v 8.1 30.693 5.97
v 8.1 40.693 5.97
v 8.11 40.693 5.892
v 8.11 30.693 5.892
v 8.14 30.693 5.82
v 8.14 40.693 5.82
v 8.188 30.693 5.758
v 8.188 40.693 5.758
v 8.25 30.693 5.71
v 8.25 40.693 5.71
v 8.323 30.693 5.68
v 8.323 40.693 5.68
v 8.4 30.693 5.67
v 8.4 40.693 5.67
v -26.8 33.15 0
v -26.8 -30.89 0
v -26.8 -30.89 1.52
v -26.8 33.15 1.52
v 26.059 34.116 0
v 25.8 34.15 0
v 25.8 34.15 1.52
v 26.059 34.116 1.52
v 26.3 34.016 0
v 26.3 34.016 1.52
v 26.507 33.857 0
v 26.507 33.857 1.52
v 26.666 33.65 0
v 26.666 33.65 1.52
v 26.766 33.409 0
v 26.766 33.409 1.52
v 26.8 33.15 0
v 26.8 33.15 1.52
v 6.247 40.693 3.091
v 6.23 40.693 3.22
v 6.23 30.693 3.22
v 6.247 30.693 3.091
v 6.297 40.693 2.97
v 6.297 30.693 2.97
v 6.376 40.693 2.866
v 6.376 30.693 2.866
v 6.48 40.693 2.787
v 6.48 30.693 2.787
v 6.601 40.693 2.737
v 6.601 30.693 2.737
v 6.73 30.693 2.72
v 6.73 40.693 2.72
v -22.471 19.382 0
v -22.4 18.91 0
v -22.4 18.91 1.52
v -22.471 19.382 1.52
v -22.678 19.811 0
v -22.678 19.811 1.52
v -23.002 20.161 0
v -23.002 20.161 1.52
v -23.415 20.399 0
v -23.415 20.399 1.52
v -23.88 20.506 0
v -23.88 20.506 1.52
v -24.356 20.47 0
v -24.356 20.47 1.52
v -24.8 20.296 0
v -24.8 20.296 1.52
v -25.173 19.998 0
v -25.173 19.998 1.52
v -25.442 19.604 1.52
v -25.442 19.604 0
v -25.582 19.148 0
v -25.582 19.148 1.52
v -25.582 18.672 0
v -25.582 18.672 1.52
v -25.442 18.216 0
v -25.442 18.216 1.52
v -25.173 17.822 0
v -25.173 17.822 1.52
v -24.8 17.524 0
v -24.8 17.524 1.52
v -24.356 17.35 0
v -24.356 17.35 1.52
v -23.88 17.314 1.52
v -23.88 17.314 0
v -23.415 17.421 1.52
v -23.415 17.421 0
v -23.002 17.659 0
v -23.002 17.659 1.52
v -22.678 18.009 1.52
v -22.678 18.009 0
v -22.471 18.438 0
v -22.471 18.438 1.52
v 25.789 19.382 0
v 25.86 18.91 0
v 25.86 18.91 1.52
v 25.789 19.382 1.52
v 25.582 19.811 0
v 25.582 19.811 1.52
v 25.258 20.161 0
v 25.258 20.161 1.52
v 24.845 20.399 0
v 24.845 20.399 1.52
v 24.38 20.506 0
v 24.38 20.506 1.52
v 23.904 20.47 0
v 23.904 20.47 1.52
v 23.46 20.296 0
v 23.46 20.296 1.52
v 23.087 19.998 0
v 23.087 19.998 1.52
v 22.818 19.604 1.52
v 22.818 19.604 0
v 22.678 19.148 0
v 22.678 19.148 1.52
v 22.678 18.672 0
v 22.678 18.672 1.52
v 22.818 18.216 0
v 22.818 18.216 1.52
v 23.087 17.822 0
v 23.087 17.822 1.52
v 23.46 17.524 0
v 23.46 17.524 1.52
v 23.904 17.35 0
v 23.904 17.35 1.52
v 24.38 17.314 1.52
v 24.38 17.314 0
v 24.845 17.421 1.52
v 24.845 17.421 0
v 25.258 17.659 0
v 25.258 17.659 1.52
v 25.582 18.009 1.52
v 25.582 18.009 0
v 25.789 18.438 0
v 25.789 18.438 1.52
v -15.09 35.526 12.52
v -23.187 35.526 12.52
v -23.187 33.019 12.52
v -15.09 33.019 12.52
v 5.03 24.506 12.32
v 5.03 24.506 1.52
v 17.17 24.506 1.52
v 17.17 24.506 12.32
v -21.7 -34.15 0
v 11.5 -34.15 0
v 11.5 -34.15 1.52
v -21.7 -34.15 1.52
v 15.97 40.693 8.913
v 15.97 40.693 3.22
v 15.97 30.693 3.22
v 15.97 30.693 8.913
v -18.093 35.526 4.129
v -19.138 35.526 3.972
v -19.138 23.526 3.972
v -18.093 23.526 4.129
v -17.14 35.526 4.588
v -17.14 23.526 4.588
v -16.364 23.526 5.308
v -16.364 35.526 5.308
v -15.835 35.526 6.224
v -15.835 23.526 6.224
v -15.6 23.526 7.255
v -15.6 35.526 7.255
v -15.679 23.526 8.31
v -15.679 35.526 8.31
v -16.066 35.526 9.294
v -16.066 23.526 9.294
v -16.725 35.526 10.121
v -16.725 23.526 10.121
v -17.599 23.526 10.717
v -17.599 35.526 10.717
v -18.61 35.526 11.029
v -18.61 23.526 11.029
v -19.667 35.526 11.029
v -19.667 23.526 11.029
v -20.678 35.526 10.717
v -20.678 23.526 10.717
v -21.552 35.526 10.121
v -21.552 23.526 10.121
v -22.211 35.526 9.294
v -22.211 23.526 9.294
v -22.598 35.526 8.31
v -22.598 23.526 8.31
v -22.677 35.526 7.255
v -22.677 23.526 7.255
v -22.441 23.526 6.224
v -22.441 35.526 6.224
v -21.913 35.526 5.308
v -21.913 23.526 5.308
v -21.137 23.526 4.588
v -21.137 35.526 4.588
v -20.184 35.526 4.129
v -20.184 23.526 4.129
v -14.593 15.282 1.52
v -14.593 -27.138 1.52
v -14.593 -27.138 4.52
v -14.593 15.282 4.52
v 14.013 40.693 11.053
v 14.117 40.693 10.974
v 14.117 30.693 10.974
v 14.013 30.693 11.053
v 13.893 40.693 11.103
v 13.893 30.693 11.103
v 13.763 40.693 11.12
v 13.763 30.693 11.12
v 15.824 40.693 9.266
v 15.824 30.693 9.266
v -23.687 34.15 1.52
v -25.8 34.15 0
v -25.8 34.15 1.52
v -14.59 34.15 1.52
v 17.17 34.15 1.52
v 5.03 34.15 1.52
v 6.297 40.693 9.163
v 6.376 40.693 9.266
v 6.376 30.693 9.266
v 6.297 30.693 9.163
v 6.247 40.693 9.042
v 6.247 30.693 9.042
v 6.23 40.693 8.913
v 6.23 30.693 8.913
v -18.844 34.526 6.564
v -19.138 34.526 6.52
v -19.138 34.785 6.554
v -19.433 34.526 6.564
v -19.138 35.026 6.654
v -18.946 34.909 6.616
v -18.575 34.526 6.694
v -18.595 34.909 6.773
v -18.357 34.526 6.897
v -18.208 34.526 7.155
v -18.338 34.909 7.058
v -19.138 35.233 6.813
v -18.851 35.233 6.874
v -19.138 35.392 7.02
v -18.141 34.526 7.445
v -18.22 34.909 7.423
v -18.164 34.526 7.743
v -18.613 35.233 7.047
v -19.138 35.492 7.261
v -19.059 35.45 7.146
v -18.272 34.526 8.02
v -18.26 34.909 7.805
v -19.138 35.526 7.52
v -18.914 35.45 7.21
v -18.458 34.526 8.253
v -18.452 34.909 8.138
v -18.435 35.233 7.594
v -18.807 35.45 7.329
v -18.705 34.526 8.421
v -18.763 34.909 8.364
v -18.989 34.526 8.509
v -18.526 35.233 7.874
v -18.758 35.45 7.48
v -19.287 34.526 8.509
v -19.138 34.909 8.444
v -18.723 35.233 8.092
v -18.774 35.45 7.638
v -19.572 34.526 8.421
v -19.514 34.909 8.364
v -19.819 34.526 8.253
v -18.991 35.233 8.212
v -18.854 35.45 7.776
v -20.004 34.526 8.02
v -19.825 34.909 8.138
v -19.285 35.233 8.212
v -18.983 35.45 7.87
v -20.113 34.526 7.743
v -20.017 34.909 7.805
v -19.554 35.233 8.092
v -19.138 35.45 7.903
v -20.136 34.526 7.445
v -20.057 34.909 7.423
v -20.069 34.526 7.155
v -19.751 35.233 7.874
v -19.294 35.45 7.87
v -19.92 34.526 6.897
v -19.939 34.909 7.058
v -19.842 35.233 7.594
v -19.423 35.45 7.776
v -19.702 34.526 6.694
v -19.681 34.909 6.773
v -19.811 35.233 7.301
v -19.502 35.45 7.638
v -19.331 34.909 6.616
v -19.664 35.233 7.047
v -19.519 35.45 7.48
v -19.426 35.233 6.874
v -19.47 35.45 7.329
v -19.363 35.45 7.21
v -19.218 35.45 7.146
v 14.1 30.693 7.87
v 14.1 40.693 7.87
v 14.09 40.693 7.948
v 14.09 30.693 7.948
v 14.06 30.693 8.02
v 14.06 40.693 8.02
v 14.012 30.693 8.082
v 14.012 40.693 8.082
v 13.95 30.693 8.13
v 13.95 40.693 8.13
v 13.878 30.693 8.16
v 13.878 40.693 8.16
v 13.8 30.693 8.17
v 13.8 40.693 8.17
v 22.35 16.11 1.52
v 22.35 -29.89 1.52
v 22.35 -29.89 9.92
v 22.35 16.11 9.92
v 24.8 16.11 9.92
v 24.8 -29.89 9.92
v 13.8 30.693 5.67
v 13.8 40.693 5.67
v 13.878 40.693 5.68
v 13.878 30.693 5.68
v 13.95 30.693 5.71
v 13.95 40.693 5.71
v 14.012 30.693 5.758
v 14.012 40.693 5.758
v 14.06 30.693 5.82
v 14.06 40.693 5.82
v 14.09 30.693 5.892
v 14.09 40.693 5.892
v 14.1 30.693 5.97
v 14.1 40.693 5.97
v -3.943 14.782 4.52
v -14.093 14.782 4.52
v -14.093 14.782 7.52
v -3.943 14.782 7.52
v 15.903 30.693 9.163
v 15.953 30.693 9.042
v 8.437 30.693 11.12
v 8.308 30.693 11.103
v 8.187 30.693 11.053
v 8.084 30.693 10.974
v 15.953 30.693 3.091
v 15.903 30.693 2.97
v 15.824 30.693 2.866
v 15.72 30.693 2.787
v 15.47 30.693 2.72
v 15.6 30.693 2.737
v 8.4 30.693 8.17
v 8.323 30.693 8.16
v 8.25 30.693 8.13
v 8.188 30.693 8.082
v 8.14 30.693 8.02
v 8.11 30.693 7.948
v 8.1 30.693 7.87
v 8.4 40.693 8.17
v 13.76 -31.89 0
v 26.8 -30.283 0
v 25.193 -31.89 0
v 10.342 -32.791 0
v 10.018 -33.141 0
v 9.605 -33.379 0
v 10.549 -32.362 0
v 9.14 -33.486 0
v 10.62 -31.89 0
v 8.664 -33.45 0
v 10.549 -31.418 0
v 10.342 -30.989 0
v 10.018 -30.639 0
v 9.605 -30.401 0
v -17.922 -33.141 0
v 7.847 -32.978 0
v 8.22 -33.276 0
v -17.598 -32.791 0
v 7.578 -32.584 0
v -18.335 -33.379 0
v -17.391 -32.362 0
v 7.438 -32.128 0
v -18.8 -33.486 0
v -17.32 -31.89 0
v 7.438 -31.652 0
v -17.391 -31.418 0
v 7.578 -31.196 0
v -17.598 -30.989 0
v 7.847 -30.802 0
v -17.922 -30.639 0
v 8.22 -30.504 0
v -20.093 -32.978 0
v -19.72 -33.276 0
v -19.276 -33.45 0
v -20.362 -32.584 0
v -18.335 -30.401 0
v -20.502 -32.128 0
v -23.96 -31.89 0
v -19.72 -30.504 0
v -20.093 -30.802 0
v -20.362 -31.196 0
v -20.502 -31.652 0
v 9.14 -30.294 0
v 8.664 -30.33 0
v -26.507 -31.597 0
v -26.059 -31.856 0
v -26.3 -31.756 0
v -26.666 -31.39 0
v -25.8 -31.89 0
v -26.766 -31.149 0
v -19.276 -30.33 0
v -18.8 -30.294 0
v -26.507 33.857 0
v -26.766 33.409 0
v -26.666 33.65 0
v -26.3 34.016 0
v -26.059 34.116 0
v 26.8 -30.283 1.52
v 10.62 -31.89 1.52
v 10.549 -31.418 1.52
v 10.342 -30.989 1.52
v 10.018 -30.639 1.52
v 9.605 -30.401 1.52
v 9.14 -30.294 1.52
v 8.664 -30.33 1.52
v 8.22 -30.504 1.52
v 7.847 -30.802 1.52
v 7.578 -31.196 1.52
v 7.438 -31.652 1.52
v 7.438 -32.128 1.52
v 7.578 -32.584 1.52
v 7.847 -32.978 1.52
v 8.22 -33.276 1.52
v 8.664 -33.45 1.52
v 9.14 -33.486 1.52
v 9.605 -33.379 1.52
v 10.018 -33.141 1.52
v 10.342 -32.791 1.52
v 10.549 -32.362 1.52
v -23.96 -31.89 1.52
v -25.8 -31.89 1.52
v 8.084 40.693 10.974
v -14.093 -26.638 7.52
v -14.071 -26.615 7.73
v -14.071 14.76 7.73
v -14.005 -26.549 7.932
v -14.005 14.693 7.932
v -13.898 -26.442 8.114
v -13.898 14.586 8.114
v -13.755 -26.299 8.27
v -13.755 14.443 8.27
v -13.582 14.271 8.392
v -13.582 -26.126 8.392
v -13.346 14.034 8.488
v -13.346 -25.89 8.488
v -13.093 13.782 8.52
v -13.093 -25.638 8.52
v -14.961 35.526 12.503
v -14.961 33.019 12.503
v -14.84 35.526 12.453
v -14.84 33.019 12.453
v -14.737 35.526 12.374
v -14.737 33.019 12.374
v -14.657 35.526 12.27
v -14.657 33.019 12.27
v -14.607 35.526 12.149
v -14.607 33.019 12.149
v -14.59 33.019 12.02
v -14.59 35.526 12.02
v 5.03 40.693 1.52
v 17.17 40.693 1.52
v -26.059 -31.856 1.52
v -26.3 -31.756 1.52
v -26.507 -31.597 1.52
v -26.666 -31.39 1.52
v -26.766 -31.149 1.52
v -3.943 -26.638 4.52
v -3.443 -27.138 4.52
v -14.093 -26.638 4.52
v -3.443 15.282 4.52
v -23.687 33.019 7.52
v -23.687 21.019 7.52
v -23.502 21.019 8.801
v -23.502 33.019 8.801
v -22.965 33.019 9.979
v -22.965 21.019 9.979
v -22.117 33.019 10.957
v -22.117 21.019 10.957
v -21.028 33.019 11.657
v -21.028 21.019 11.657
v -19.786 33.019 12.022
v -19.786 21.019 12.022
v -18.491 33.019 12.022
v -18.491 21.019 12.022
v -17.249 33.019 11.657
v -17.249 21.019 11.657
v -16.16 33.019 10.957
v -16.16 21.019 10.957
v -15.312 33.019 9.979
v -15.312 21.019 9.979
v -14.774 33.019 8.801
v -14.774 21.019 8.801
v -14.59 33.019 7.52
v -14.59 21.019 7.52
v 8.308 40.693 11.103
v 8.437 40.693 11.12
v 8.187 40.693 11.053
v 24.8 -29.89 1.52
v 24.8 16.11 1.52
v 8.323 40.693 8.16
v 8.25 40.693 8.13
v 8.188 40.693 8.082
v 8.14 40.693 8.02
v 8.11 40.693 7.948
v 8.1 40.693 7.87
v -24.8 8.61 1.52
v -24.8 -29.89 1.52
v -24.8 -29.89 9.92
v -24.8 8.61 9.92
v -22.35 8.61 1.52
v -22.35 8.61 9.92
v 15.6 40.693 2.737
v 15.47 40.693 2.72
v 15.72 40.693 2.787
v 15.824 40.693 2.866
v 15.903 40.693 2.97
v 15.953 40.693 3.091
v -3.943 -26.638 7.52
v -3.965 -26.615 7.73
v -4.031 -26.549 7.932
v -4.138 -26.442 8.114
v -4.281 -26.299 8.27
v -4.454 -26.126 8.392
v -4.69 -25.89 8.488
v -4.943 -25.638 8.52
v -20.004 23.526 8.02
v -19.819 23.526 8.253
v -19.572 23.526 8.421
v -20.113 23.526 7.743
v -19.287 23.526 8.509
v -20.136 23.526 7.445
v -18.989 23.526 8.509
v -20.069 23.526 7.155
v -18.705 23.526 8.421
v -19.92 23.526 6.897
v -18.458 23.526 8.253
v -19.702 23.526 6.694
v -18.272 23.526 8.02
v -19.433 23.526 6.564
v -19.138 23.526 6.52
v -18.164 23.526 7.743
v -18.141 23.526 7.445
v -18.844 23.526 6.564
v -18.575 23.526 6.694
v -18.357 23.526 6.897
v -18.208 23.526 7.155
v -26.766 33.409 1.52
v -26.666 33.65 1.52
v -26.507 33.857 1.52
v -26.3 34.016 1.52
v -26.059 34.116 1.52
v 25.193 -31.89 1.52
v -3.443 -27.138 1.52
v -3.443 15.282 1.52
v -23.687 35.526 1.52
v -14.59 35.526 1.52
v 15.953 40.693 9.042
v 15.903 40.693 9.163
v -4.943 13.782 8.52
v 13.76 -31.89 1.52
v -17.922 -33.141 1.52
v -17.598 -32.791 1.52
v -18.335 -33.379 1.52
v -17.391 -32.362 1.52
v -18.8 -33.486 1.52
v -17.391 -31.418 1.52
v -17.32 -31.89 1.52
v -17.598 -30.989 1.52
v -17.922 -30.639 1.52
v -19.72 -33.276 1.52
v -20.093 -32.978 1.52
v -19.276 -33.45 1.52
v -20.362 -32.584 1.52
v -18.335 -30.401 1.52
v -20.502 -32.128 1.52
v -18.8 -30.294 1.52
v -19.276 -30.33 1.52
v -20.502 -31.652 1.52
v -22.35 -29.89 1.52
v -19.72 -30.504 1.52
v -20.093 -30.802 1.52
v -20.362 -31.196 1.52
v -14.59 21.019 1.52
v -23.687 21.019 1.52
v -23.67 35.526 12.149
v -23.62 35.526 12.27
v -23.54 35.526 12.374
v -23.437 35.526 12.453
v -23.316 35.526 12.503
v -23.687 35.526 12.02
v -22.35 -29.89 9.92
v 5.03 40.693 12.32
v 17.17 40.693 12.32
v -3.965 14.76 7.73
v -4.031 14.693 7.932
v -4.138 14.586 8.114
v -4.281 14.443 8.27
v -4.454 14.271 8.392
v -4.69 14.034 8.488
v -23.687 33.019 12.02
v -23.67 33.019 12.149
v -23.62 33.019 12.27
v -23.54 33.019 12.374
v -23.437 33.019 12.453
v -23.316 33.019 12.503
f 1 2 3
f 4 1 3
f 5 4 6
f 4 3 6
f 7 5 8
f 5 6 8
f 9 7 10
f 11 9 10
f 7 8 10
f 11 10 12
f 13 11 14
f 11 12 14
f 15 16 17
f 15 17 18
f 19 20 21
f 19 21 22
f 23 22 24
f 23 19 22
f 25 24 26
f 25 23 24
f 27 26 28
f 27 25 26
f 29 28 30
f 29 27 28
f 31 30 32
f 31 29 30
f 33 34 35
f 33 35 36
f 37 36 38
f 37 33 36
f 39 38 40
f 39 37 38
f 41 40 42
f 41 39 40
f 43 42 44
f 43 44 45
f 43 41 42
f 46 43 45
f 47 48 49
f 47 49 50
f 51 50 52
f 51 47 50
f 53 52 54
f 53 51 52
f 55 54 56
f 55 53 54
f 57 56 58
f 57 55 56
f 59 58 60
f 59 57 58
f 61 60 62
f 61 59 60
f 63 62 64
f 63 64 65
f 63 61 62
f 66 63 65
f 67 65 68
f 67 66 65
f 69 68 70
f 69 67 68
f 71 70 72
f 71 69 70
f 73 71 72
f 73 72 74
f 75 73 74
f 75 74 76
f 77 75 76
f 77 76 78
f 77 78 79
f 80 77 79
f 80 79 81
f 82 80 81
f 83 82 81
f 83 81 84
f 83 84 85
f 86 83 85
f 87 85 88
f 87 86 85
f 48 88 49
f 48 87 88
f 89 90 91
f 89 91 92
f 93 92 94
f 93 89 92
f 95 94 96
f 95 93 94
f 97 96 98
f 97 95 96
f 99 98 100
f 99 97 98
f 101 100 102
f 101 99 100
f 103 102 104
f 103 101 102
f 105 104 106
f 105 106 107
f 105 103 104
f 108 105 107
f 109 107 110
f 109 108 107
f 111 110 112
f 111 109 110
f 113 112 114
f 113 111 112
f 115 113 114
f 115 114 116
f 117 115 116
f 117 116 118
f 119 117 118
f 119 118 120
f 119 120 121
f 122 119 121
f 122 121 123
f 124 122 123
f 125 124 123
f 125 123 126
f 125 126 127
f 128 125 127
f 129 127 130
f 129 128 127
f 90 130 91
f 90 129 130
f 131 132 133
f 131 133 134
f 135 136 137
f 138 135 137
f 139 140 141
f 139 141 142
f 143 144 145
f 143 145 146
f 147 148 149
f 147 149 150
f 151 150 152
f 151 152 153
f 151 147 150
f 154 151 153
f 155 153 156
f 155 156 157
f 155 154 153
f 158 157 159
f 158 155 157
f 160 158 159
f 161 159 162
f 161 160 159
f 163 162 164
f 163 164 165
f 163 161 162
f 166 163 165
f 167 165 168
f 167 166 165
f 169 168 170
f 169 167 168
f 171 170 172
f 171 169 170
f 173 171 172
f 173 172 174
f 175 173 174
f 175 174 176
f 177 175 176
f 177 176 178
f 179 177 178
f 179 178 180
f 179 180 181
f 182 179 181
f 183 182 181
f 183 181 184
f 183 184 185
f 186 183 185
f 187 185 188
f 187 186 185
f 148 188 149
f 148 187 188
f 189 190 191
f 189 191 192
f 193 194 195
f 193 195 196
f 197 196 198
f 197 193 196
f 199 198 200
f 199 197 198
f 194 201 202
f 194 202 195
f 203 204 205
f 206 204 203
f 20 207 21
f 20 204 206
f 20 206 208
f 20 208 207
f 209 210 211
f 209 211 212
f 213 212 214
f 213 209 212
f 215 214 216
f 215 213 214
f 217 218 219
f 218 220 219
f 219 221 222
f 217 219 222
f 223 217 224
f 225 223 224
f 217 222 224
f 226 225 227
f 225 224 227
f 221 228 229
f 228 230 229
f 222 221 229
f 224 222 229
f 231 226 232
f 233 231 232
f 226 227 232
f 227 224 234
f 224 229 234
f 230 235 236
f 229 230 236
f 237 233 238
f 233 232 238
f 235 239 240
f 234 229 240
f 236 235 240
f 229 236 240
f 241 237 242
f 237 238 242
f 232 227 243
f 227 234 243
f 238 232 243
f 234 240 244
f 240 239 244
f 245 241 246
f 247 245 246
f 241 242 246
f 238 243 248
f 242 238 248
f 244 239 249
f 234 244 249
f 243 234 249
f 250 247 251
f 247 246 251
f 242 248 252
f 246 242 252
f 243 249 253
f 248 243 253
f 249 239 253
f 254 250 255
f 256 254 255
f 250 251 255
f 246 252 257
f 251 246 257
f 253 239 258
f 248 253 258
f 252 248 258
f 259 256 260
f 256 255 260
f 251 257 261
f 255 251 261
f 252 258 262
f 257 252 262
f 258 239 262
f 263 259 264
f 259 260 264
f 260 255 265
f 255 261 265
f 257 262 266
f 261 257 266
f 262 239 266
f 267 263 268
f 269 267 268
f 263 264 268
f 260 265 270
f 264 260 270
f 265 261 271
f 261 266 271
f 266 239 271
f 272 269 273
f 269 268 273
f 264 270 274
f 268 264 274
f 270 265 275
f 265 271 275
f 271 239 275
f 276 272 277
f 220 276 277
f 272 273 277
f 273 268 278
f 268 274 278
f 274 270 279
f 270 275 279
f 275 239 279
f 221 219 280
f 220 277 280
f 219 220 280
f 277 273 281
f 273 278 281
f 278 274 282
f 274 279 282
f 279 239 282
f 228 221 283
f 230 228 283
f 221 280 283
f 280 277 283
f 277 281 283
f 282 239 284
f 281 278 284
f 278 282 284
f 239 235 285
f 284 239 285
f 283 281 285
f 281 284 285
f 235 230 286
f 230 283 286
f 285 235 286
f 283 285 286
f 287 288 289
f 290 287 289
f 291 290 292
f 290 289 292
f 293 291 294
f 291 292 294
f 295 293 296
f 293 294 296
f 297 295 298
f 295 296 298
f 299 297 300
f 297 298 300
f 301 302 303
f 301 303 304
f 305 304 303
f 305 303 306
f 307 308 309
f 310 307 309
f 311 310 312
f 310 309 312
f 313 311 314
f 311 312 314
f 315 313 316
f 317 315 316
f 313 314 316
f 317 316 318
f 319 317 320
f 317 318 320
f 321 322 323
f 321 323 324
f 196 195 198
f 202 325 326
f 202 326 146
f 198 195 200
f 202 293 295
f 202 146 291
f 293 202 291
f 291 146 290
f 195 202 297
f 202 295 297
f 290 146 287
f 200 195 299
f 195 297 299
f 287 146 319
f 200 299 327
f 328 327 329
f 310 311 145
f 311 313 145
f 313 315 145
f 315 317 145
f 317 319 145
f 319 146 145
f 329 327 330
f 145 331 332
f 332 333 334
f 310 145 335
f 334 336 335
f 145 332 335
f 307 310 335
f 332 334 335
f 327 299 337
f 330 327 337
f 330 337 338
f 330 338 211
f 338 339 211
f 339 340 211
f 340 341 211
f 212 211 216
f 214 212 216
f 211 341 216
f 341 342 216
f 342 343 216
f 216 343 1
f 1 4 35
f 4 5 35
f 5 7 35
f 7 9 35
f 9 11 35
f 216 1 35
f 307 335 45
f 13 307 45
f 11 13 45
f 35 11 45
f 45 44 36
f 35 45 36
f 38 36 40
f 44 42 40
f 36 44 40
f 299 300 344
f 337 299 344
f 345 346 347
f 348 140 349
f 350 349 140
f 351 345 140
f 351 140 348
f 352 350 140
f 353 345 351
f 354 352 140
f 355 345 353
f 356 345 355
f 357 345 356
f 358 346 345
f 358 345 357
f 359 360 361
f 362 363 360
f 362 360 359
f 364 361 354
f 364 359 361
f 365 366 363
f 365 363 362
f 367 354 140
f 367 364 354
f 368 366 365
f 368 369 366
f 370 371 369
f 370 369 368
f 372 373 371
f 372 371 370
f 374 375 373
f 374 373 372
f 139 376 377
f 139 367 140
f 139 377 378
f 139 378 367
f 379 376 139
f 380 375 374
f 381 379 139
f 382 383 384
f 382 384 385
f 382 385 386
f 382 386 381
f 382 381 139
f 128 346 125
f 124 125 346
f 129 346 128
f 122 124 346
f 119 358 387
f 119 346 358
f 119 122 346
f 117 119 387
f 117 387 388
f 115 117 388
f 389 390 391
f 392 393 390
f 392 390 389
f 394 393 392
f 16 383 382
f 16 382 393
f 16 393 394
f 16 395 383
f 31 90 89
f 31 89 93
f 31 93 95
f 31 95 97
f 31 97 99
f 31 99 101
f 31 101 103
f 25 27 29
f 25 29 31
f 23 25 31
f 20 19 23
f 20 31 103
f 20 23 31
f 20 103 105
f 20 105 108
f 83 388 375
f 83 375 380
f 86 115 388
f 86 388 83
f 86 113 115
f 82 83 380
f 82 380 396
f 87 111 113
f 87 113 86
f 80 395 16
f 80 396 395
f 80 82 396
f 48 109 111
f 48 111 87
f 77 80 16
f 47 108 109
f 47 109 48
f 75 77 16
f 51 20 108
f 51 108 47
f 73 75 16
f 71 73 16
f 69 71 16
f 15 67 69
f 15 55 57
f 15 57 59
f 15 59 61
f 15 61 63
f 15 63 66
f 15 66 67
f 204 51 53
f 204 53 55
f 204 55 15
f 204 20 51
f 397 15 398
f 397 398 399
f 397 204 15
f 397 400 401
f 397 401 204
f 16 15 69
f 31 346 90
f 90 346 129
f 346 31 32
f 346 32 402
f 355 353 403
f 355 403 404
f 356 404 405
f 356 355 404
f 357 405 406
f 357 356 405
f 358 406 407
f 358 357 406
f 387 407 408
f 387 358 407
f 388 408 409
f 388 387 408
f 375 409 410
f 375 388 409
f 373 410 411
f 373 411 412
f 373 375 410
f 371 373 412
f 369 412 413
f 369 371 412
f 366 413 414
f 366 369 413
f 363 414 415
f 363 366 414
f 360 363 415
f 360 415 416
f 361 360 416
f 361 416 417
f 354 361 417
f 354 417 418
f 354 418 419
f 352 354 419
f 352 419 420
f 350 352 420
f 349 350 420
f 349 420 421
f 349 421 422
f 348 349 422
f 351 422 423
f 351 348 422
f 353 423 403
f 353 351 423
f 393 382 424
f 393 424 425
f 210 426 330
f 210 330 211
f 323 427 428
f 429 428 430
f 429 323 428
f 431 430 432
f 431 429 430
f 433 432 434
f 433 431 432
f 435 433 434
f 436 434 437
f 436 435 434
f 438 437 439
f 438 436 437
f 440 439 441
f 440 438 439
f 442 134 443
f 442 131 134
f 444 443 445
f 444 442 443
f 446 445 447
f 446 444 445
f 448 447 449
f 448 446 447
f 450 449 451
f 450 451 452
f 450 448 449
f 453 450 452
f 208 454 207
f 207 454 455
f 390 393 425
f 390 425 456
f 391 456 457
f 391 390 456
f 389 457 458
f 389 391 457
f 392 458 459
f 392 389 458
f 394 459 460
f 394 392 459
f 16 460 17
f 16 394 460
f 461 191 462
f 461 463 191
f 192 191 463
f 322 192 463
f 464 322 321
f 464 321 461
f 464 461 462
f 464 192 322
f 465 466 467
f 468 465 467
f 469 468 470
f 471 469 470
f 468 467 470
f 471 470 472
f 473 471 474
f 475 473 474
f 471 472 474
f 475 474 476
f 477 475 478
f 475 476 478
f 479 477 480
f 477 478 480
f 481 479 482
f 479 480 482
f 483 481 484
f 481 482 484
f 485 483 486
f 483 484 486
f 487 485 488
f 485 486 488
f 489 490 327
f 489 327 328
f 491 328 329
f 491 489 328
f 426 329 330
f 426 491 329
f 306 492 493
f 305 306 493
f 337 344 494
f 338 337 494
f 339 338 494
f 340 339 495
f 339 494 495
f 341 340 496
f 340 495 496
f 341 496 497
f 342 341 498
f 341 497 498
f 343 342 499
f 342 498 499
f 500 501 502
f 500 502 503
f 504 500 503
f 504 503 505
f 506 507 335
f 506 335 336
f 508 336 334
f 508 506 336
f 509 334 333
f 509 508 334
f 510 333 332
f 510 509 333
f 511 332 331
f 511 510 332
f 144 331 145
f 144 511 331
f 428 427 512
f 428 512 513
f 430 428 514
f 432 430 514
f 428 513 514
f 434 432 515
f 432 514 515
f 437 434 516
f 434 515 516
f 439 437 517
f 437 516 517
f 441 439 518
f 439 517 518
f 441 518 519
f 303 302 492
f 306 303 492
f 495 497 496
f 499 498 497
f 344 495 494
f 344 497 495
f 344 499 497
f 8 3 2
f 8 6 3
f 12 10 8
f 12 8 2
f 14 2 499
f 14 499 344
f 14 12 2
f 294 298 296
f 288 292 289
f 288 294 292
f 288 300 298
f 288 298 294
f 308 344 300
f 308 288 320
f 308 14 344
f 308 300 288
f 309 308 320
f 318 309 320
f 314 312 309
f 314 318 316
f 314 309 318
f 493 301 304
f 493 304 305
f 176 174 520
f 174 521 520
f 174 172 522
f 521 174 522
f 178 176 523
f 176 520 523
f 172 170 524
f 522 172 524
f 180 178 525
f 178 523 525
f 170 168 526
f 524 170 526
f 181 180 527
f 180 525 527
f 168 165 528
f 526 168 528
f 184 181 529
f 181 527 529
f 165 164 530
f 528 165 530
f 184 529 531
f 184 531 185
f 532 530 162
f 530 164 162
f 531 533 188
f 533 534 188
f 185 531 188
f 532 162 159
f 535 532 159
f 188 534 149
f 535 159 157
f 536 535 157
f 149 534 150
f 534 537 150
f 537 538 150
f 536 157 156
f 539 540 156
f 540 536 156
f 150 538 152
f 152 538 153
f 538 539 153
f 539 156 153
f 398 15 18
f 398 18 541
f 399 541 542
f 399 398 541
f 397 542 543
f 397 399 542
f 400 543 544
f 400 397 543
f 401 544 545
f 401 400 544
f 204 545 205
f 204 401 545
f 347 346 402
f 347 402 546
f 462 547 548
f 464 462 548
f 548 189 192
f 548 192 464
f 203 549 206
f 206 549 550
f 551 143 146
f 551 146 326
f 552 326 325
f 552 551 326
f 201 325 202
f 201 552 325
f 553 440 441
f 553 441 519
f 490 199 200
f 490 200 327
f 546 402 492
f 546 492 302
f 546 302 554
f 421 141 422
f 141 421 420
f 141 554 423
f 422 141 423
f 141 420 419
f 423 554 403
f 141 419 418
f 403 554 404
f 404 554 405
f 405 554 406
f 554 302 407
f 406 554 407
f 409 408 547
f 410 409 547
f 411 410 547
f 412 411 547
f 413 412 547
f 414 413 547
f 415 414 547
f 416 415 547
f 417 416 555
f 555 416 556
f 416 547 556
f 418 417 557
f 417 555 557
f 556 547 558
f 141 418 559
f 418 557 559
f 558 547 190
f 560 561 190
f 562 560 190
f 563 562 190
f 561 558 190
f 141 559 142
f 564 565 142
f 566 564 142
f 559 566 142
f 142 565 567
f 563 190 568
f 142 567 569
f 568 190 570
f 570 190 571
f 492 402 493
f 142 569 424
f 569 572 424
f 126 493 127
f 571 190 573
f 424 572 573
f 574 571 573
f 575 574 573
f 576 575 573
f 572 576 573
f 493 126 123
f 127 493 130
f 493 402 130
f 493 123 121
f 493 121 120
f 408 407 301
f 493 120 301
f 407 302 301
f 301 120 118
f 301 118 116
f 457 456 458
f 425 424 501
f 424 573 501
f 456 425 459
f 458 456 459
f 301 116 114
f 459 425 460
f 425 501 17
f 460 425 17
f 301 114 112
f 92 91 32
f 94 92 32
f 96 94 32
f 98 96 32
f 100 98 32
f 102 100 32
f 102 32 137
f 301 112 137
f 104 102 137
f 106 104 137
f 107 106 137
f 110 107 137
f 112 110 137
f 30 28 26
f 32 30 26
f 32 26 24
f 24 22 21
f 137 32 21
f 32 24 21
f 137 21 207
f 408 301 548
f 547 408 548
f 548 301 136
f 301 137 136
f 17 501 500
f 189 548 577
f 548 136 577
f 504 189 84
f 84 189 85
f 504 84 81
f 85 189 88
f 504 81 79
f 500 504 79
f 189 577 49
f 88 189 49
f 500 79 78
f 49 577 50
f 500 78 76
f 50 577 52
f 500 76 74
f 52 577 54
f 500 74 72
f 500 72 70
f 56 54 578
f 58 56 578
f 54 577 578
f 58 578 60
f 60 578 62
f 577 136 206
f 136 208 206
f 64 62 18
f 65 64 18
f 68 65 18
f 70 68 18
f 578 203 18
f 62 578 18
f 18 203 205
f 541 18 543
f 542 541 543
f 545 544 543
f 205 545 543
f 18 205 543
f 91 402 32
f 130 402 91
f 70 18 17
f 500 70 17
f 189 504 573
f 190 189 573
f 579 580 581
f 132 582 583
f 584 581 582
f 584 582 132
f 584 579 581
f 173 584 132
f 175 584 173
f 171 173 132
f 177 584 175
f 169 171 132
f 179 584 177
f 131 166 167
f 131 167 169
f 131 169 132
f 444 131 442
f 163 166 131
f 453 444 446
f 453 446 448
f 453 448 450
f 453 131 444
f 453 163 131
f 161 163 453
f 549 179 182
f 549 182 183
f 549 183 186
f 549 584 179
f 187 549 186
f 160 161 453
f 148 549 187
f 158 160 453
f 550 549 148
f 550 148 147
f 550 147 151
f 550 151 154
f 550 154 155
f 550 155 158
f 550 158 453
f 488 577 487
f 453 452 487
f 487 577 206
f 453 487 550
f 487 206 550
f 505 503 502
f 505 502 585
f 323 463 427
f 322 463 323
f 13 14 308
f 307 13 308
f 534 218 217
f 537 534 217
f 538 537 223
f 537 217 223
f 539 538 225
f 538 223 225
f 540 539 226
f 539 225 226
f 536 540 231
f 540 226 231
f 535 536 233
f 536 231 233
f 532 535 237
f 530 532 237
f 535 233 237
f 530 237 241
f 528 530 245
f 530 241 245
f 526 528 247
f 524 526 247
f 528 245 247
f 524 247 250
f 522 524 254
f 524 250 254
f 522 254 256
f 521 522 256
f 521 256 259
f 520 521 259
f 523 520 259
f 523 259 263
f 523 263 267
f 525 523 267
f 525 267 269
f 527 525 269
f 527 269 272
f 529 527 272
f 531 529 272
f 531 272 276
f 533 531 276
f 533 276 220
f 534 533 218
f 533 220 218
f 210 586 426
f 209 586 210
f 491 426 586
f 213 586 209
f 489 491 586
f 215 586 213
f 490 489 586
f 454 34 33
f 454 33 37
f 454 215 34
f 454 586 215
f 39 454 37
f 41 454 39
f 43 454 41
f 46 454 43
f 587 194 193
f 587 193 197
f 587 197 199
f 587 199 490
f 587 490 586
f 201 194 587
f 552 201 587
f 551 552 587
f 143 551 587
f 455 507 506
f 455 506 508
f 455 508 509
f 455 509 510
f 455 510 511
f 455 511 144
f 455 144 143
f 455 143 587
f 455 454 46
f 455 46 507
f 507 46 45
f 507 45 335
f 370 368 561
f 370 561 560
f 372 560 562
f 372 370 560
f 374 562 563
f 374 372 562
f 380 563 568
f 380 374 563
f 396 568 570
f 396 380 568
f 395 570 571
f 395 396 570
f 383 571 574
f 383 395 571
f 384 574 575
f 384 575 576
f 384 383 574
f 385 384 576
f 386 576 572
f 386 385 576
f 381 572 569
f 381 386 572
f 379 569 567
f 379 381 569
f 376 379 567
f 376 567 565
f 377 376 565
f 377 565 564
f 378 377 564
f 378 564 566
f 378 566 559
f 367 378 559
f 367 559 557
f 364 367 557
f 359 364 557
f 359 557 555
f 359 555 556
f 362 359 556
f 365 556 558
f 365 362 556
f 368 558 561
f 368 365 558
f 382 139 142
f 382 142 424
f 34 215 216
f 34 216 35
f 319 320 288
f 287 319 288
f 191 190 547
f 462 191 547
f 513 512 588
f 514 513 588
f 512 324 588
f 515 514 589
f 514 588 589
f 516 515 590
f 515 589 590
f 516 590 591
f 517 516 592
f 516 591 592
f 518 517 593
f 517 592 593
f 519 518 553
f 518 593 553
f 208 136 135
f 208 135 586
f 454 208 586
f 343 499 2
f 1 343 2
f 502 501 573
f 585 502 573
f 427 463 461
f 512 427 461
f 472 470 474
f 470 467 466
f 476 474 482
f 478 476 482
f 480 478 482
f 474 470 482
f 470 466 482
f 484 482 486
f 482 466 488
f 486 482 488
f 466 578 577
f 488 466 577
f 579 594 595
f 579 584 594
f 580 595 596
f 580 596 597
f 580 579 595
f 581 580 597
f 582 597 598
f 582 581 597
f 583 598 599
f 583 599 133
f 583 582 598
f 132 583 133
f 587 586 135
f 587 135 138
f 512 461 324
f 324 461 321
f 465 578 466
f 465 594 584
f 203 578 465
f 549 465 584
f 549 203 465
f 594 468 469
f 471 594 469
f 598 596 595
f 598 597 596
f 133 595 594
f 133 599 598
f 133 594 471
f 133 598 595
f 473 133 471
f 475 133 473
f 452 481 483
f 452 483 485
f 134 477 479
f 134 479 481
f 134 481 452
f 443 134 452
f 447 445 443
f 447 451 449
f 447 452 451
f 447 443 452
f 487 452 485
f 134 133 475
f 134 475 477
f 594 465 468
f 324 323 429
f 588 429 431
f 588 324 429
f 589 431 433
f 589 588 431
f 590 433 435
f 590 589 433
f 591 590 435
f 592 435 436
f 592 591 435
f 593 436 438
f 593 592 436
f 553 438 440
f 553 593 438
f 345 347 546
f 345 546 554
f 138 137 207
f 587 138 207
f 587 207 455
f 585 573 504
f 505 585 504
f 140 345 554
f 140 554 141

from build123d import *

# Parameters (mm, degrees)
ESBO_O2_R                = 1.6
RESSALTO_EXTRUS_O1_DEPTH = 1.52
ESBO_O3_W                = 9.096465254
ESBO_O3_H                = 14.507430643
RESSALTO_EXTRUS_O2_DEPTH = 11
ESBO_O4_W                = 2.45
ESBO_O4_H                = 38.5
ESBO_O4_H_2              = 46
RESSALTO_EXTRUS_O3_DEPTH = 8.4
CORTE_EXTRUS_O1_DEPTH    = 12
ESBO_O6_R                = 3.548232627
ESBO_O6_R_2              = 1
CORTE_EXTRUS_O2_DEPTH    = 12
FILETE1_R                = 1
FILETE2_R                = 0.5
ESBO_O7_W                = 12.140382315
ESBO_O7_H                = 16.18717642
RESSALTO_EXTRUS_O4_DEPTH = 10.8
CORTE_EXTRUS_O3_DEPTH    = 10
ESBO_O10_W               = 10.15094297
ESBO_O10_H               = 41.419472655
RESSALTO_EXTRUS_O5_DEPTH = 7
FILETE3_R                = 1
ESBO_O11_W               = 11.15094297
ESBO_O11_H               = 42.419472655
RESSALTO_EXTRUS_O6_DEPTH = 3


with BuildPart() as part:
    # Esboço2 → Ressalto-extrusão1 (new body)
    with BuildSketch(Plane.XY):
        with BuildLine():
            Line((26.8, -30.283131706), (25.193131706, -31.89))
            Line((25.193131706, -31.89), (13.76, -31.89))
            Line((13.76, -31.89), (11.5, -34.15))
            Line((11.5, -34.15), (-21.7, -34.15))
            Line((-21.7, -34.15), (-23.96, -31.89))
            Line((-23.96, -31.89), (-25.8, -31.89))
            ThreePointArc((-25.8, -31.89), (-26.507106781, -31.597106781), (-26.8, -30.89))
            Line((-26.8, -30.89), (-26.8, 33.15))
            ThreePointArc((-26.8, 33.15), (-26.507106781, 33.857106781), (-25.8, 34.15))
            Line((-25.8, 34.15), (25.8, 34.15))
            ThreePointArc((25.8, 34.15), (26.507106781, 33.857106781), (26.8, 33.15))
            Line((26.8, 33.15), (26.8, -30.283131706))
        make_face()
        with Locations((-24, 18.91)):
            Circle(ESBO_O2_R, mode=Mode.SUBTRACT)
        with Locations((24.26, 18.91)):
            Circle(ESBO_O2_R, mode=Mode.SUBTRACT)
        with Locations((-18.92, -31.89)):
            Circle(ESBO_O2_R, mode=Mode.SUBTRACT)
        with Locations((9.02, -31.89)):
            Circle(ESBO_O2_R, mode=Mode.SUBTRACT)
    extrude(amount=RESSALTO_EXTRUS_O1_DEPTH)

    # Esboço3 → Ressalto-extrusão2 (add)
    with BuildSketch(Plane.XY.offset(1.52)):
        with Locations((-19.138446447, 28.272429058)):
            Rectangle(ESBO_O3_W, ESBO_O3_H)
    extrude(amount=RESSALTO_EXTRUS_O2_DEPTH)

    # Esboço4 → Ressalto-extrusão3 (add)
    with BuildSketch(Plane.XY.offset(1.52)):
        with Locations((-23.575, -10.64)):
            Rectangle(ESBO_O4_W, ESBO_O4_H)
        with Locations((23.575, -6.89)):
            Rectangle(ESBO_O4_W, ESBO_O4_H_2)
    extrude(amount=RESSALTO_EXTRUS_O3_DEPTH)

    # Esboço5 → Corte-extrusão1 (cut)
    with BuildSketch(Plane.XZ.offset(-21.018713736)):
        with BuildLine():
            Line((-14.59021382, 7.52), (-14.59021382, 12.52))
            Line((-14.59021382, 12.52), (-23.686679074, 12.52))
            Line((-23.686679074, 12.52), (-23.686679074, 7.52))
            ThreePointArc((-23.686679074, 7.52), (-19.138446447, 12.068232627), (-14.59021382, 7.52))
        make_face()
    extrude(amount=-CORTE_EXTRUS_O1_DEPTH, mode=Mode.SUBTRACT)

    # Esboço6 → Corte-extrusão2 (cut)
    with BuildSketch(Plane.XZ.offset(-35.526144379)):
        with Locations(Location((-19.138446447, 7.52, 0), (0, 0, 270))):
            Circle(ESBO_O6_R)
        with Locations(Location((-19.138446447, 7.52, 0), (0, 0, 270))):
            Circle(ESBO_O6_R_2, mode=Mode.SUBTRACT)
    extrude(amount=CORTE_EXTRUS_O2_DEPTH, mode=Mode.SUBTRACT)

    # Filete1
    filete1_edges = [part.edges().sort_by_distance(p)[0] for p in [
        (-19.138446447, 35.526144379, 8.52),
    ]]
    fillet(filete1_edges, radius=FILETE1_R)

    # Filete2
    filete2_edges = [part.edges().sort_by_distance(p)[0] for p in [
        (-23.686679074, 34.272429057, 12.52),
        (-14.59021382, 34.272429057, 12.52),
    ]]
    fillet(filete2_edges, radius=FILETE2_R)

    # Esboço7 → Ressalto-extrusão4 (add)
    with BuildSketch(Plane.XY.offset(1.52)):
        with Locations((11.10014829, 32.59935696)):
            Rectangle(ESBO_O7_W, ESBO_O7_H)
    extrude(amount=RESSALTO_EXTRUS_O4_DEPTH)

    # Esboço9 → Corte-extrusão3 (cut)
    with BuildSketch(Plane(origin=(0, 40.69294517, 0), x_dir=(1, 0, 0), z_dir=(0, 1, 0))):
        with BuildLine():
            Line((6.729957133, -2.72), (15.470339448, -2.72))
            ThreePointArc((15.470339448, -2.72), (15.823892839, -2.866446609), (15.970339448, -3.22))
            Line((15.970339448, -3.22), (15.970339448, -8.912893219))
            ThreePointArc((15.970339448, -8.912893219), (15.932279214, -9.104234935), (15.823892839, -9.266446609))
            Line((15.823892839, -9.266446609), (14.116786058, -10.973553391))
            ThreePointArc((14.116786058, -10.973553391), (13.954574383, -11.081939766), (13.763232667, -11.12))
            Line((13.763232667, -11.12), (8.437063914, -11.12))
            ThreePointArc((8.437063914, -11.12), (8.245722198, -11.081939766), (8.083510523, -10.973553391))
            Line((8.083510523, -10.973553391), (6.376403742, -9.266446609))
            ThreePointArc((6.376403742, -9.266446609), (6.268017366, -9.104234935), (6.229957133, -8.912893219))
            Line((6.229957133, -8.912893219), (6.229957133, -3.22))
            ThreePointArc((6.229957133, -3.22), (6.376403742, -2.866446609), (6.729957133, -2.72))
        make_face()
        with BuildLine():
            Line((13.80014829, -8.17), (8.40014829, -8.17))
            ThreePointArc((8.40014829, -8.17), (8.188016256, -8.082132034), (8.10014829, -7.87))
            Line((8.10014829, -7.87), (8.10014829, -5.97))
            ThreePointArc((8.10014829, -5.97), (8.188016256, -5.757867966), (8.40014829, -5.67))
            Line((8.40014829, -5.67), (13.80014829, -5.67))
            ThreePointArc((13.80014829, -5.67), (14.012280325, -5.757867966), (14.10014829, -5.97))
            Line((14.10014829, -5.97), (14.10014829, -7.87))
            ThreePointArc((14.10014829, -7.87), (14.012280325, -8.082132034), (13.80014829, -8.17))
        make_face(mode=Mode.SUBTRACT)
    extrude(amount=-CORTE_EXTRUS_O3_DEPTH, mode=Mode.SUBTRACT)

    # Esboço10 → Ressalto-extrusão5 (add)
    with BuildSketch(Plane.XY.offset(1.52)):
        with Locations((-9.018025228, -5.927819482)):
            Rectangle(ESBO_O10_W, ESBO_O10_H)
    extrude(amount=RESSALTO_EXTRUS_O5_DEPTH)

    # Filete3
    filete3_edges = [part.edges().sort_by_distance(p)[0] for p in [
        (-3.942553743, -5.927819482, 8.52),
        (-9.018025228, 14.781916846, 8.52),
        (-14.093496713, -5.927819482, 8.52),
        (-9.018025228, -26.637555809, 8.52),
    ]]
    fillet(filete3_edges, radius=FILETE3_R)

    # Esboço11 → Ressalto-extrusão6 (add)
    with BuildSketch(Plane.XY.offset(1.52)):
        with Locations((-9.018025228, -5.927819482)):
            Rectangle(ESBO_O11_W, ESBO_O11_H)
    extrude(amount=RESSALTO_EXTRUS_O6_DEPTH)


solid = part.part
